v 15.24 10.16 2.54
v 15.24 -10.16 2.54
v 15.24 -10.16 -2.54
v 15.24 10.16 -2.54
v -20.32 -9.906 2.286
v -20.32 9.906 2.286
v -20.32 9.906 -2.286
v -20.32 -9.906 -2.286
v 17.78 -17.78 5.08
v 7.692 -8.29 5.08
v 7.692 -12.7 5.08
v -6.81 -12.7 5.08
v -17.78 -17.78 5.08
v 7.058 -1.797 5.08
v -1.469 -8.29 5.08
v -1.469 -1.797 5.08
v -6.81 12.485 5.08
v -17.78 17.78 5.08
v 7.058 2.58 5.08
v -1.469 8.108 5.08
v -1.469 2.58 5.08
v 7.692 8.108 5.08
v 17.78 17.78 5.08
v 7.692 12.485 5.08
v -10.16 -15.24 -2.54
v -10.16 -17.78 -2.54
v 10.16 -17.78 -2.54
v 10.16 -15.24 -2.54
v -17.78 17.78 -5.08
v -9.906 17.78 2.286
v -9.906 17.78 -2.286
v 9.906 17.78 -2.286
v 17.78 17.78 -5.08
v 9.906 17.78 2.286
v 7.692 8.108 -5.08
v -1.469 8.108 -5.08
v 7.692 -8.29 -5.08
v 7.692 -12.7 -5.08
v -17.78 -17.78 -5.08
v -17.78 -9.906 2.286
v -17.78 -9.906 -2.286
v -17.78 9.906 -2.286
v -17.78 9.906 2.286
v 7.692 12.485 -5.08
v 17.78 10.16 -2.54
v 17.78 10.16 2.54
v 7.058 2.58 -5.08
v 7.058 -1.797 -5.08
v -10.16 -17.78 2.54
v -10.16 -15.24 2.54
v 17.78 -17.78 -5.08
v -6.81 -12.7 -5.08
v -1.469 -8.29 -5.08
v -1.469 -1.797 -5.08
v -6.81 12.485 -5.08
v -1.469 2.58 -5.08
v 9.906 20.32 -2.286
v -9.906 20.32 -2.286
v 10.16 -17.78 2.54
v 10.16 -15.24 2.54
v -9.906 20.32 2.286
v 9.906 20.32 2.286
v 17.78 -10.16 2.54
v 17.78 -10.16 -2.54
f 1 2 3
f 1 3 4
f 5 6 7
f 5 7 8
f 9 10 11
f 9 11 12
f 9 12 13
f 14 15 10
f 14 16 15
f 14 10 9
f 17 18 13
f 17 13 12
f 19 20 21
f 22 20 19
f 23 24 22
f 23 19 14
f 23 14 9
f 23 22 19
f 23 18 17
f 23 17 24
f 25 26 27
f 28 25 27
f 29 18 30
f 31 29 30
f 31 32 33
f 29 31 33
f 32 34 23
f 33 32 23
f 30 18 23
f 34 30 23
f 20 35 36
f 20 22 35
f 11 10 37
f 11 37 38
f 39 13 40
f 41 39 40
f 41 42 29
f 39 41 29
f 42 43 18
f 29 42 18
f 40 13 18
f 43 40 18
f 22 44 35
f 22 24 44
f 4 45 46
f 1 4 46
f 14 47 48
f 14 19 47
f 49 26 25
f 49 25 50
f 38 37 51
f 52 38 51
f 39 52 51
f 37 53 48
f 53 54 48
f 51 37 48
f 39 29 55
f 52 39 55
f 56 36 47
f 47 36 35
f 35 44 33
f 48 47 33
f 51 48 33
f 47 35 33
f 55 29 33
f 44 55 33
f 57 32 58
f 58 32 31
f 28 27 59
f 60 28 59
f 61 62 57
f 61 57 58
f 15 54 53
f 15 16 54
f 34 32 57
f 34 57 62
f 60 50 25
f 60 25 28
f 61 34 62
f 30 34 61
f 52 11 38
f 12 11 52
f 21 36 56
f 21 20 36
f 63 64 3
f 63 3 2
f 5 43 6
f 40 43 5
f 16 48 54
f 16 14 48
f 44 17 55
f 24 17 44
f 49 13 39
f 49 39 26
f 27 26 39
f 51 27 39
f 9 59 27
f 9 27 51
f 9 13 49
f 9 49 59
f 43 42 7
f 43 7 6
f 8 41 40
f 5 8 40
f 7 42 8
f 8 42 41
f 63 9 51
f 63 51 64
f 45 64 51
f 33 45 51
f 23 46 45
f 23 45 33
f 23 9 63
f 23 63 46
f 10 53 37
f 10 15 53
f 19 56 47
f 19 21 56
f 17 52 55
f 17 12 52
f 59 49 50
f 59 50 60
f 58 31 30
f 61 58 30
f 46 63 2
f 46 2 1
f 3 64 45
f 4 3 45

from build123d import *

# Parameters (mm, degrees)
F0_W     = 35.56
F0_H     = 35.56
F1_DEPTH = 5.08
F2_W     = 19.812
F2_H     = 4.572
F3_DEPTH = 2.54
F4_W     = 19.812
F4_H     = 4.572
F5_DEPTH = 2.54
F6_W     = 20.32
F6_H     = 5.08
F7_DEPTH = 2.54
F8_W     = 20.32
F8_H     = 5.08
F9_DEPTH = 2.54


with BuildPart() as f1:
    # F0 (on Top) → F1 (new body, symmetric)
    with BuildSketch(Plane.XY):
        Rectangle(F0_W, F0_H)
        Polygon((7.6922092014, -8.2902777778), (7.6922092014, -12.7), (-6.8102647569, -12.7), (-6.8102647569, 12.4850260417), (7.6922092014, 12.4850260417), (7.6922092014, 8.1083767361), (-1.4689887153, 8.1083767361), (-1.4689887153, 2.5796875), (7.0583116319, 2.5796875), (7.0583116319, -1.7969618056), (-1.4689887153, -1.7969618056), (-1.4689887153, -8.2902777778), align=None, mode=Mode.SUBTRACT)
    extrude(amount=F1_DEPTH, both=True)

    # F2 (on face) → F3 (join)
    with BuildSketch(Plane(origin=(0, 17.78, 0), x_dir=(-1, 0, 0), z_dir=(0, 1, 0))):
        Rectangle(F2_W, F2_H)
    extrude(amount=F3_DEPTH)

    # F4 (on face) → F5 (join)
    with BuildSketch(Plane(origin=(-17.78, 0, 0), x_dir=(0, -1, 0), z_dir=(-1, 0, 0))):
        Rectangle(F4_W, F4_H)
    extrude(amount=F5_DEPTH)

    # F6 (on face) → F7 (cut)
    with BuildSketch(Plane.XZ.offset(17.78)):
        Rectangle(F6_W, F6_H)
    extrude(amount=-F7_DEPTH, mode=Mode.SUBTRACT)

    # F8 (on face) → F9 (cut)
    with BuildSketch(Plane.YZ.offset(17.78)):
        Rectangle(F8_W, F8_H)
    extrude(amount=-F9_DEPTH, mode=Mode.SUBTRACT)


solid = f1.part
